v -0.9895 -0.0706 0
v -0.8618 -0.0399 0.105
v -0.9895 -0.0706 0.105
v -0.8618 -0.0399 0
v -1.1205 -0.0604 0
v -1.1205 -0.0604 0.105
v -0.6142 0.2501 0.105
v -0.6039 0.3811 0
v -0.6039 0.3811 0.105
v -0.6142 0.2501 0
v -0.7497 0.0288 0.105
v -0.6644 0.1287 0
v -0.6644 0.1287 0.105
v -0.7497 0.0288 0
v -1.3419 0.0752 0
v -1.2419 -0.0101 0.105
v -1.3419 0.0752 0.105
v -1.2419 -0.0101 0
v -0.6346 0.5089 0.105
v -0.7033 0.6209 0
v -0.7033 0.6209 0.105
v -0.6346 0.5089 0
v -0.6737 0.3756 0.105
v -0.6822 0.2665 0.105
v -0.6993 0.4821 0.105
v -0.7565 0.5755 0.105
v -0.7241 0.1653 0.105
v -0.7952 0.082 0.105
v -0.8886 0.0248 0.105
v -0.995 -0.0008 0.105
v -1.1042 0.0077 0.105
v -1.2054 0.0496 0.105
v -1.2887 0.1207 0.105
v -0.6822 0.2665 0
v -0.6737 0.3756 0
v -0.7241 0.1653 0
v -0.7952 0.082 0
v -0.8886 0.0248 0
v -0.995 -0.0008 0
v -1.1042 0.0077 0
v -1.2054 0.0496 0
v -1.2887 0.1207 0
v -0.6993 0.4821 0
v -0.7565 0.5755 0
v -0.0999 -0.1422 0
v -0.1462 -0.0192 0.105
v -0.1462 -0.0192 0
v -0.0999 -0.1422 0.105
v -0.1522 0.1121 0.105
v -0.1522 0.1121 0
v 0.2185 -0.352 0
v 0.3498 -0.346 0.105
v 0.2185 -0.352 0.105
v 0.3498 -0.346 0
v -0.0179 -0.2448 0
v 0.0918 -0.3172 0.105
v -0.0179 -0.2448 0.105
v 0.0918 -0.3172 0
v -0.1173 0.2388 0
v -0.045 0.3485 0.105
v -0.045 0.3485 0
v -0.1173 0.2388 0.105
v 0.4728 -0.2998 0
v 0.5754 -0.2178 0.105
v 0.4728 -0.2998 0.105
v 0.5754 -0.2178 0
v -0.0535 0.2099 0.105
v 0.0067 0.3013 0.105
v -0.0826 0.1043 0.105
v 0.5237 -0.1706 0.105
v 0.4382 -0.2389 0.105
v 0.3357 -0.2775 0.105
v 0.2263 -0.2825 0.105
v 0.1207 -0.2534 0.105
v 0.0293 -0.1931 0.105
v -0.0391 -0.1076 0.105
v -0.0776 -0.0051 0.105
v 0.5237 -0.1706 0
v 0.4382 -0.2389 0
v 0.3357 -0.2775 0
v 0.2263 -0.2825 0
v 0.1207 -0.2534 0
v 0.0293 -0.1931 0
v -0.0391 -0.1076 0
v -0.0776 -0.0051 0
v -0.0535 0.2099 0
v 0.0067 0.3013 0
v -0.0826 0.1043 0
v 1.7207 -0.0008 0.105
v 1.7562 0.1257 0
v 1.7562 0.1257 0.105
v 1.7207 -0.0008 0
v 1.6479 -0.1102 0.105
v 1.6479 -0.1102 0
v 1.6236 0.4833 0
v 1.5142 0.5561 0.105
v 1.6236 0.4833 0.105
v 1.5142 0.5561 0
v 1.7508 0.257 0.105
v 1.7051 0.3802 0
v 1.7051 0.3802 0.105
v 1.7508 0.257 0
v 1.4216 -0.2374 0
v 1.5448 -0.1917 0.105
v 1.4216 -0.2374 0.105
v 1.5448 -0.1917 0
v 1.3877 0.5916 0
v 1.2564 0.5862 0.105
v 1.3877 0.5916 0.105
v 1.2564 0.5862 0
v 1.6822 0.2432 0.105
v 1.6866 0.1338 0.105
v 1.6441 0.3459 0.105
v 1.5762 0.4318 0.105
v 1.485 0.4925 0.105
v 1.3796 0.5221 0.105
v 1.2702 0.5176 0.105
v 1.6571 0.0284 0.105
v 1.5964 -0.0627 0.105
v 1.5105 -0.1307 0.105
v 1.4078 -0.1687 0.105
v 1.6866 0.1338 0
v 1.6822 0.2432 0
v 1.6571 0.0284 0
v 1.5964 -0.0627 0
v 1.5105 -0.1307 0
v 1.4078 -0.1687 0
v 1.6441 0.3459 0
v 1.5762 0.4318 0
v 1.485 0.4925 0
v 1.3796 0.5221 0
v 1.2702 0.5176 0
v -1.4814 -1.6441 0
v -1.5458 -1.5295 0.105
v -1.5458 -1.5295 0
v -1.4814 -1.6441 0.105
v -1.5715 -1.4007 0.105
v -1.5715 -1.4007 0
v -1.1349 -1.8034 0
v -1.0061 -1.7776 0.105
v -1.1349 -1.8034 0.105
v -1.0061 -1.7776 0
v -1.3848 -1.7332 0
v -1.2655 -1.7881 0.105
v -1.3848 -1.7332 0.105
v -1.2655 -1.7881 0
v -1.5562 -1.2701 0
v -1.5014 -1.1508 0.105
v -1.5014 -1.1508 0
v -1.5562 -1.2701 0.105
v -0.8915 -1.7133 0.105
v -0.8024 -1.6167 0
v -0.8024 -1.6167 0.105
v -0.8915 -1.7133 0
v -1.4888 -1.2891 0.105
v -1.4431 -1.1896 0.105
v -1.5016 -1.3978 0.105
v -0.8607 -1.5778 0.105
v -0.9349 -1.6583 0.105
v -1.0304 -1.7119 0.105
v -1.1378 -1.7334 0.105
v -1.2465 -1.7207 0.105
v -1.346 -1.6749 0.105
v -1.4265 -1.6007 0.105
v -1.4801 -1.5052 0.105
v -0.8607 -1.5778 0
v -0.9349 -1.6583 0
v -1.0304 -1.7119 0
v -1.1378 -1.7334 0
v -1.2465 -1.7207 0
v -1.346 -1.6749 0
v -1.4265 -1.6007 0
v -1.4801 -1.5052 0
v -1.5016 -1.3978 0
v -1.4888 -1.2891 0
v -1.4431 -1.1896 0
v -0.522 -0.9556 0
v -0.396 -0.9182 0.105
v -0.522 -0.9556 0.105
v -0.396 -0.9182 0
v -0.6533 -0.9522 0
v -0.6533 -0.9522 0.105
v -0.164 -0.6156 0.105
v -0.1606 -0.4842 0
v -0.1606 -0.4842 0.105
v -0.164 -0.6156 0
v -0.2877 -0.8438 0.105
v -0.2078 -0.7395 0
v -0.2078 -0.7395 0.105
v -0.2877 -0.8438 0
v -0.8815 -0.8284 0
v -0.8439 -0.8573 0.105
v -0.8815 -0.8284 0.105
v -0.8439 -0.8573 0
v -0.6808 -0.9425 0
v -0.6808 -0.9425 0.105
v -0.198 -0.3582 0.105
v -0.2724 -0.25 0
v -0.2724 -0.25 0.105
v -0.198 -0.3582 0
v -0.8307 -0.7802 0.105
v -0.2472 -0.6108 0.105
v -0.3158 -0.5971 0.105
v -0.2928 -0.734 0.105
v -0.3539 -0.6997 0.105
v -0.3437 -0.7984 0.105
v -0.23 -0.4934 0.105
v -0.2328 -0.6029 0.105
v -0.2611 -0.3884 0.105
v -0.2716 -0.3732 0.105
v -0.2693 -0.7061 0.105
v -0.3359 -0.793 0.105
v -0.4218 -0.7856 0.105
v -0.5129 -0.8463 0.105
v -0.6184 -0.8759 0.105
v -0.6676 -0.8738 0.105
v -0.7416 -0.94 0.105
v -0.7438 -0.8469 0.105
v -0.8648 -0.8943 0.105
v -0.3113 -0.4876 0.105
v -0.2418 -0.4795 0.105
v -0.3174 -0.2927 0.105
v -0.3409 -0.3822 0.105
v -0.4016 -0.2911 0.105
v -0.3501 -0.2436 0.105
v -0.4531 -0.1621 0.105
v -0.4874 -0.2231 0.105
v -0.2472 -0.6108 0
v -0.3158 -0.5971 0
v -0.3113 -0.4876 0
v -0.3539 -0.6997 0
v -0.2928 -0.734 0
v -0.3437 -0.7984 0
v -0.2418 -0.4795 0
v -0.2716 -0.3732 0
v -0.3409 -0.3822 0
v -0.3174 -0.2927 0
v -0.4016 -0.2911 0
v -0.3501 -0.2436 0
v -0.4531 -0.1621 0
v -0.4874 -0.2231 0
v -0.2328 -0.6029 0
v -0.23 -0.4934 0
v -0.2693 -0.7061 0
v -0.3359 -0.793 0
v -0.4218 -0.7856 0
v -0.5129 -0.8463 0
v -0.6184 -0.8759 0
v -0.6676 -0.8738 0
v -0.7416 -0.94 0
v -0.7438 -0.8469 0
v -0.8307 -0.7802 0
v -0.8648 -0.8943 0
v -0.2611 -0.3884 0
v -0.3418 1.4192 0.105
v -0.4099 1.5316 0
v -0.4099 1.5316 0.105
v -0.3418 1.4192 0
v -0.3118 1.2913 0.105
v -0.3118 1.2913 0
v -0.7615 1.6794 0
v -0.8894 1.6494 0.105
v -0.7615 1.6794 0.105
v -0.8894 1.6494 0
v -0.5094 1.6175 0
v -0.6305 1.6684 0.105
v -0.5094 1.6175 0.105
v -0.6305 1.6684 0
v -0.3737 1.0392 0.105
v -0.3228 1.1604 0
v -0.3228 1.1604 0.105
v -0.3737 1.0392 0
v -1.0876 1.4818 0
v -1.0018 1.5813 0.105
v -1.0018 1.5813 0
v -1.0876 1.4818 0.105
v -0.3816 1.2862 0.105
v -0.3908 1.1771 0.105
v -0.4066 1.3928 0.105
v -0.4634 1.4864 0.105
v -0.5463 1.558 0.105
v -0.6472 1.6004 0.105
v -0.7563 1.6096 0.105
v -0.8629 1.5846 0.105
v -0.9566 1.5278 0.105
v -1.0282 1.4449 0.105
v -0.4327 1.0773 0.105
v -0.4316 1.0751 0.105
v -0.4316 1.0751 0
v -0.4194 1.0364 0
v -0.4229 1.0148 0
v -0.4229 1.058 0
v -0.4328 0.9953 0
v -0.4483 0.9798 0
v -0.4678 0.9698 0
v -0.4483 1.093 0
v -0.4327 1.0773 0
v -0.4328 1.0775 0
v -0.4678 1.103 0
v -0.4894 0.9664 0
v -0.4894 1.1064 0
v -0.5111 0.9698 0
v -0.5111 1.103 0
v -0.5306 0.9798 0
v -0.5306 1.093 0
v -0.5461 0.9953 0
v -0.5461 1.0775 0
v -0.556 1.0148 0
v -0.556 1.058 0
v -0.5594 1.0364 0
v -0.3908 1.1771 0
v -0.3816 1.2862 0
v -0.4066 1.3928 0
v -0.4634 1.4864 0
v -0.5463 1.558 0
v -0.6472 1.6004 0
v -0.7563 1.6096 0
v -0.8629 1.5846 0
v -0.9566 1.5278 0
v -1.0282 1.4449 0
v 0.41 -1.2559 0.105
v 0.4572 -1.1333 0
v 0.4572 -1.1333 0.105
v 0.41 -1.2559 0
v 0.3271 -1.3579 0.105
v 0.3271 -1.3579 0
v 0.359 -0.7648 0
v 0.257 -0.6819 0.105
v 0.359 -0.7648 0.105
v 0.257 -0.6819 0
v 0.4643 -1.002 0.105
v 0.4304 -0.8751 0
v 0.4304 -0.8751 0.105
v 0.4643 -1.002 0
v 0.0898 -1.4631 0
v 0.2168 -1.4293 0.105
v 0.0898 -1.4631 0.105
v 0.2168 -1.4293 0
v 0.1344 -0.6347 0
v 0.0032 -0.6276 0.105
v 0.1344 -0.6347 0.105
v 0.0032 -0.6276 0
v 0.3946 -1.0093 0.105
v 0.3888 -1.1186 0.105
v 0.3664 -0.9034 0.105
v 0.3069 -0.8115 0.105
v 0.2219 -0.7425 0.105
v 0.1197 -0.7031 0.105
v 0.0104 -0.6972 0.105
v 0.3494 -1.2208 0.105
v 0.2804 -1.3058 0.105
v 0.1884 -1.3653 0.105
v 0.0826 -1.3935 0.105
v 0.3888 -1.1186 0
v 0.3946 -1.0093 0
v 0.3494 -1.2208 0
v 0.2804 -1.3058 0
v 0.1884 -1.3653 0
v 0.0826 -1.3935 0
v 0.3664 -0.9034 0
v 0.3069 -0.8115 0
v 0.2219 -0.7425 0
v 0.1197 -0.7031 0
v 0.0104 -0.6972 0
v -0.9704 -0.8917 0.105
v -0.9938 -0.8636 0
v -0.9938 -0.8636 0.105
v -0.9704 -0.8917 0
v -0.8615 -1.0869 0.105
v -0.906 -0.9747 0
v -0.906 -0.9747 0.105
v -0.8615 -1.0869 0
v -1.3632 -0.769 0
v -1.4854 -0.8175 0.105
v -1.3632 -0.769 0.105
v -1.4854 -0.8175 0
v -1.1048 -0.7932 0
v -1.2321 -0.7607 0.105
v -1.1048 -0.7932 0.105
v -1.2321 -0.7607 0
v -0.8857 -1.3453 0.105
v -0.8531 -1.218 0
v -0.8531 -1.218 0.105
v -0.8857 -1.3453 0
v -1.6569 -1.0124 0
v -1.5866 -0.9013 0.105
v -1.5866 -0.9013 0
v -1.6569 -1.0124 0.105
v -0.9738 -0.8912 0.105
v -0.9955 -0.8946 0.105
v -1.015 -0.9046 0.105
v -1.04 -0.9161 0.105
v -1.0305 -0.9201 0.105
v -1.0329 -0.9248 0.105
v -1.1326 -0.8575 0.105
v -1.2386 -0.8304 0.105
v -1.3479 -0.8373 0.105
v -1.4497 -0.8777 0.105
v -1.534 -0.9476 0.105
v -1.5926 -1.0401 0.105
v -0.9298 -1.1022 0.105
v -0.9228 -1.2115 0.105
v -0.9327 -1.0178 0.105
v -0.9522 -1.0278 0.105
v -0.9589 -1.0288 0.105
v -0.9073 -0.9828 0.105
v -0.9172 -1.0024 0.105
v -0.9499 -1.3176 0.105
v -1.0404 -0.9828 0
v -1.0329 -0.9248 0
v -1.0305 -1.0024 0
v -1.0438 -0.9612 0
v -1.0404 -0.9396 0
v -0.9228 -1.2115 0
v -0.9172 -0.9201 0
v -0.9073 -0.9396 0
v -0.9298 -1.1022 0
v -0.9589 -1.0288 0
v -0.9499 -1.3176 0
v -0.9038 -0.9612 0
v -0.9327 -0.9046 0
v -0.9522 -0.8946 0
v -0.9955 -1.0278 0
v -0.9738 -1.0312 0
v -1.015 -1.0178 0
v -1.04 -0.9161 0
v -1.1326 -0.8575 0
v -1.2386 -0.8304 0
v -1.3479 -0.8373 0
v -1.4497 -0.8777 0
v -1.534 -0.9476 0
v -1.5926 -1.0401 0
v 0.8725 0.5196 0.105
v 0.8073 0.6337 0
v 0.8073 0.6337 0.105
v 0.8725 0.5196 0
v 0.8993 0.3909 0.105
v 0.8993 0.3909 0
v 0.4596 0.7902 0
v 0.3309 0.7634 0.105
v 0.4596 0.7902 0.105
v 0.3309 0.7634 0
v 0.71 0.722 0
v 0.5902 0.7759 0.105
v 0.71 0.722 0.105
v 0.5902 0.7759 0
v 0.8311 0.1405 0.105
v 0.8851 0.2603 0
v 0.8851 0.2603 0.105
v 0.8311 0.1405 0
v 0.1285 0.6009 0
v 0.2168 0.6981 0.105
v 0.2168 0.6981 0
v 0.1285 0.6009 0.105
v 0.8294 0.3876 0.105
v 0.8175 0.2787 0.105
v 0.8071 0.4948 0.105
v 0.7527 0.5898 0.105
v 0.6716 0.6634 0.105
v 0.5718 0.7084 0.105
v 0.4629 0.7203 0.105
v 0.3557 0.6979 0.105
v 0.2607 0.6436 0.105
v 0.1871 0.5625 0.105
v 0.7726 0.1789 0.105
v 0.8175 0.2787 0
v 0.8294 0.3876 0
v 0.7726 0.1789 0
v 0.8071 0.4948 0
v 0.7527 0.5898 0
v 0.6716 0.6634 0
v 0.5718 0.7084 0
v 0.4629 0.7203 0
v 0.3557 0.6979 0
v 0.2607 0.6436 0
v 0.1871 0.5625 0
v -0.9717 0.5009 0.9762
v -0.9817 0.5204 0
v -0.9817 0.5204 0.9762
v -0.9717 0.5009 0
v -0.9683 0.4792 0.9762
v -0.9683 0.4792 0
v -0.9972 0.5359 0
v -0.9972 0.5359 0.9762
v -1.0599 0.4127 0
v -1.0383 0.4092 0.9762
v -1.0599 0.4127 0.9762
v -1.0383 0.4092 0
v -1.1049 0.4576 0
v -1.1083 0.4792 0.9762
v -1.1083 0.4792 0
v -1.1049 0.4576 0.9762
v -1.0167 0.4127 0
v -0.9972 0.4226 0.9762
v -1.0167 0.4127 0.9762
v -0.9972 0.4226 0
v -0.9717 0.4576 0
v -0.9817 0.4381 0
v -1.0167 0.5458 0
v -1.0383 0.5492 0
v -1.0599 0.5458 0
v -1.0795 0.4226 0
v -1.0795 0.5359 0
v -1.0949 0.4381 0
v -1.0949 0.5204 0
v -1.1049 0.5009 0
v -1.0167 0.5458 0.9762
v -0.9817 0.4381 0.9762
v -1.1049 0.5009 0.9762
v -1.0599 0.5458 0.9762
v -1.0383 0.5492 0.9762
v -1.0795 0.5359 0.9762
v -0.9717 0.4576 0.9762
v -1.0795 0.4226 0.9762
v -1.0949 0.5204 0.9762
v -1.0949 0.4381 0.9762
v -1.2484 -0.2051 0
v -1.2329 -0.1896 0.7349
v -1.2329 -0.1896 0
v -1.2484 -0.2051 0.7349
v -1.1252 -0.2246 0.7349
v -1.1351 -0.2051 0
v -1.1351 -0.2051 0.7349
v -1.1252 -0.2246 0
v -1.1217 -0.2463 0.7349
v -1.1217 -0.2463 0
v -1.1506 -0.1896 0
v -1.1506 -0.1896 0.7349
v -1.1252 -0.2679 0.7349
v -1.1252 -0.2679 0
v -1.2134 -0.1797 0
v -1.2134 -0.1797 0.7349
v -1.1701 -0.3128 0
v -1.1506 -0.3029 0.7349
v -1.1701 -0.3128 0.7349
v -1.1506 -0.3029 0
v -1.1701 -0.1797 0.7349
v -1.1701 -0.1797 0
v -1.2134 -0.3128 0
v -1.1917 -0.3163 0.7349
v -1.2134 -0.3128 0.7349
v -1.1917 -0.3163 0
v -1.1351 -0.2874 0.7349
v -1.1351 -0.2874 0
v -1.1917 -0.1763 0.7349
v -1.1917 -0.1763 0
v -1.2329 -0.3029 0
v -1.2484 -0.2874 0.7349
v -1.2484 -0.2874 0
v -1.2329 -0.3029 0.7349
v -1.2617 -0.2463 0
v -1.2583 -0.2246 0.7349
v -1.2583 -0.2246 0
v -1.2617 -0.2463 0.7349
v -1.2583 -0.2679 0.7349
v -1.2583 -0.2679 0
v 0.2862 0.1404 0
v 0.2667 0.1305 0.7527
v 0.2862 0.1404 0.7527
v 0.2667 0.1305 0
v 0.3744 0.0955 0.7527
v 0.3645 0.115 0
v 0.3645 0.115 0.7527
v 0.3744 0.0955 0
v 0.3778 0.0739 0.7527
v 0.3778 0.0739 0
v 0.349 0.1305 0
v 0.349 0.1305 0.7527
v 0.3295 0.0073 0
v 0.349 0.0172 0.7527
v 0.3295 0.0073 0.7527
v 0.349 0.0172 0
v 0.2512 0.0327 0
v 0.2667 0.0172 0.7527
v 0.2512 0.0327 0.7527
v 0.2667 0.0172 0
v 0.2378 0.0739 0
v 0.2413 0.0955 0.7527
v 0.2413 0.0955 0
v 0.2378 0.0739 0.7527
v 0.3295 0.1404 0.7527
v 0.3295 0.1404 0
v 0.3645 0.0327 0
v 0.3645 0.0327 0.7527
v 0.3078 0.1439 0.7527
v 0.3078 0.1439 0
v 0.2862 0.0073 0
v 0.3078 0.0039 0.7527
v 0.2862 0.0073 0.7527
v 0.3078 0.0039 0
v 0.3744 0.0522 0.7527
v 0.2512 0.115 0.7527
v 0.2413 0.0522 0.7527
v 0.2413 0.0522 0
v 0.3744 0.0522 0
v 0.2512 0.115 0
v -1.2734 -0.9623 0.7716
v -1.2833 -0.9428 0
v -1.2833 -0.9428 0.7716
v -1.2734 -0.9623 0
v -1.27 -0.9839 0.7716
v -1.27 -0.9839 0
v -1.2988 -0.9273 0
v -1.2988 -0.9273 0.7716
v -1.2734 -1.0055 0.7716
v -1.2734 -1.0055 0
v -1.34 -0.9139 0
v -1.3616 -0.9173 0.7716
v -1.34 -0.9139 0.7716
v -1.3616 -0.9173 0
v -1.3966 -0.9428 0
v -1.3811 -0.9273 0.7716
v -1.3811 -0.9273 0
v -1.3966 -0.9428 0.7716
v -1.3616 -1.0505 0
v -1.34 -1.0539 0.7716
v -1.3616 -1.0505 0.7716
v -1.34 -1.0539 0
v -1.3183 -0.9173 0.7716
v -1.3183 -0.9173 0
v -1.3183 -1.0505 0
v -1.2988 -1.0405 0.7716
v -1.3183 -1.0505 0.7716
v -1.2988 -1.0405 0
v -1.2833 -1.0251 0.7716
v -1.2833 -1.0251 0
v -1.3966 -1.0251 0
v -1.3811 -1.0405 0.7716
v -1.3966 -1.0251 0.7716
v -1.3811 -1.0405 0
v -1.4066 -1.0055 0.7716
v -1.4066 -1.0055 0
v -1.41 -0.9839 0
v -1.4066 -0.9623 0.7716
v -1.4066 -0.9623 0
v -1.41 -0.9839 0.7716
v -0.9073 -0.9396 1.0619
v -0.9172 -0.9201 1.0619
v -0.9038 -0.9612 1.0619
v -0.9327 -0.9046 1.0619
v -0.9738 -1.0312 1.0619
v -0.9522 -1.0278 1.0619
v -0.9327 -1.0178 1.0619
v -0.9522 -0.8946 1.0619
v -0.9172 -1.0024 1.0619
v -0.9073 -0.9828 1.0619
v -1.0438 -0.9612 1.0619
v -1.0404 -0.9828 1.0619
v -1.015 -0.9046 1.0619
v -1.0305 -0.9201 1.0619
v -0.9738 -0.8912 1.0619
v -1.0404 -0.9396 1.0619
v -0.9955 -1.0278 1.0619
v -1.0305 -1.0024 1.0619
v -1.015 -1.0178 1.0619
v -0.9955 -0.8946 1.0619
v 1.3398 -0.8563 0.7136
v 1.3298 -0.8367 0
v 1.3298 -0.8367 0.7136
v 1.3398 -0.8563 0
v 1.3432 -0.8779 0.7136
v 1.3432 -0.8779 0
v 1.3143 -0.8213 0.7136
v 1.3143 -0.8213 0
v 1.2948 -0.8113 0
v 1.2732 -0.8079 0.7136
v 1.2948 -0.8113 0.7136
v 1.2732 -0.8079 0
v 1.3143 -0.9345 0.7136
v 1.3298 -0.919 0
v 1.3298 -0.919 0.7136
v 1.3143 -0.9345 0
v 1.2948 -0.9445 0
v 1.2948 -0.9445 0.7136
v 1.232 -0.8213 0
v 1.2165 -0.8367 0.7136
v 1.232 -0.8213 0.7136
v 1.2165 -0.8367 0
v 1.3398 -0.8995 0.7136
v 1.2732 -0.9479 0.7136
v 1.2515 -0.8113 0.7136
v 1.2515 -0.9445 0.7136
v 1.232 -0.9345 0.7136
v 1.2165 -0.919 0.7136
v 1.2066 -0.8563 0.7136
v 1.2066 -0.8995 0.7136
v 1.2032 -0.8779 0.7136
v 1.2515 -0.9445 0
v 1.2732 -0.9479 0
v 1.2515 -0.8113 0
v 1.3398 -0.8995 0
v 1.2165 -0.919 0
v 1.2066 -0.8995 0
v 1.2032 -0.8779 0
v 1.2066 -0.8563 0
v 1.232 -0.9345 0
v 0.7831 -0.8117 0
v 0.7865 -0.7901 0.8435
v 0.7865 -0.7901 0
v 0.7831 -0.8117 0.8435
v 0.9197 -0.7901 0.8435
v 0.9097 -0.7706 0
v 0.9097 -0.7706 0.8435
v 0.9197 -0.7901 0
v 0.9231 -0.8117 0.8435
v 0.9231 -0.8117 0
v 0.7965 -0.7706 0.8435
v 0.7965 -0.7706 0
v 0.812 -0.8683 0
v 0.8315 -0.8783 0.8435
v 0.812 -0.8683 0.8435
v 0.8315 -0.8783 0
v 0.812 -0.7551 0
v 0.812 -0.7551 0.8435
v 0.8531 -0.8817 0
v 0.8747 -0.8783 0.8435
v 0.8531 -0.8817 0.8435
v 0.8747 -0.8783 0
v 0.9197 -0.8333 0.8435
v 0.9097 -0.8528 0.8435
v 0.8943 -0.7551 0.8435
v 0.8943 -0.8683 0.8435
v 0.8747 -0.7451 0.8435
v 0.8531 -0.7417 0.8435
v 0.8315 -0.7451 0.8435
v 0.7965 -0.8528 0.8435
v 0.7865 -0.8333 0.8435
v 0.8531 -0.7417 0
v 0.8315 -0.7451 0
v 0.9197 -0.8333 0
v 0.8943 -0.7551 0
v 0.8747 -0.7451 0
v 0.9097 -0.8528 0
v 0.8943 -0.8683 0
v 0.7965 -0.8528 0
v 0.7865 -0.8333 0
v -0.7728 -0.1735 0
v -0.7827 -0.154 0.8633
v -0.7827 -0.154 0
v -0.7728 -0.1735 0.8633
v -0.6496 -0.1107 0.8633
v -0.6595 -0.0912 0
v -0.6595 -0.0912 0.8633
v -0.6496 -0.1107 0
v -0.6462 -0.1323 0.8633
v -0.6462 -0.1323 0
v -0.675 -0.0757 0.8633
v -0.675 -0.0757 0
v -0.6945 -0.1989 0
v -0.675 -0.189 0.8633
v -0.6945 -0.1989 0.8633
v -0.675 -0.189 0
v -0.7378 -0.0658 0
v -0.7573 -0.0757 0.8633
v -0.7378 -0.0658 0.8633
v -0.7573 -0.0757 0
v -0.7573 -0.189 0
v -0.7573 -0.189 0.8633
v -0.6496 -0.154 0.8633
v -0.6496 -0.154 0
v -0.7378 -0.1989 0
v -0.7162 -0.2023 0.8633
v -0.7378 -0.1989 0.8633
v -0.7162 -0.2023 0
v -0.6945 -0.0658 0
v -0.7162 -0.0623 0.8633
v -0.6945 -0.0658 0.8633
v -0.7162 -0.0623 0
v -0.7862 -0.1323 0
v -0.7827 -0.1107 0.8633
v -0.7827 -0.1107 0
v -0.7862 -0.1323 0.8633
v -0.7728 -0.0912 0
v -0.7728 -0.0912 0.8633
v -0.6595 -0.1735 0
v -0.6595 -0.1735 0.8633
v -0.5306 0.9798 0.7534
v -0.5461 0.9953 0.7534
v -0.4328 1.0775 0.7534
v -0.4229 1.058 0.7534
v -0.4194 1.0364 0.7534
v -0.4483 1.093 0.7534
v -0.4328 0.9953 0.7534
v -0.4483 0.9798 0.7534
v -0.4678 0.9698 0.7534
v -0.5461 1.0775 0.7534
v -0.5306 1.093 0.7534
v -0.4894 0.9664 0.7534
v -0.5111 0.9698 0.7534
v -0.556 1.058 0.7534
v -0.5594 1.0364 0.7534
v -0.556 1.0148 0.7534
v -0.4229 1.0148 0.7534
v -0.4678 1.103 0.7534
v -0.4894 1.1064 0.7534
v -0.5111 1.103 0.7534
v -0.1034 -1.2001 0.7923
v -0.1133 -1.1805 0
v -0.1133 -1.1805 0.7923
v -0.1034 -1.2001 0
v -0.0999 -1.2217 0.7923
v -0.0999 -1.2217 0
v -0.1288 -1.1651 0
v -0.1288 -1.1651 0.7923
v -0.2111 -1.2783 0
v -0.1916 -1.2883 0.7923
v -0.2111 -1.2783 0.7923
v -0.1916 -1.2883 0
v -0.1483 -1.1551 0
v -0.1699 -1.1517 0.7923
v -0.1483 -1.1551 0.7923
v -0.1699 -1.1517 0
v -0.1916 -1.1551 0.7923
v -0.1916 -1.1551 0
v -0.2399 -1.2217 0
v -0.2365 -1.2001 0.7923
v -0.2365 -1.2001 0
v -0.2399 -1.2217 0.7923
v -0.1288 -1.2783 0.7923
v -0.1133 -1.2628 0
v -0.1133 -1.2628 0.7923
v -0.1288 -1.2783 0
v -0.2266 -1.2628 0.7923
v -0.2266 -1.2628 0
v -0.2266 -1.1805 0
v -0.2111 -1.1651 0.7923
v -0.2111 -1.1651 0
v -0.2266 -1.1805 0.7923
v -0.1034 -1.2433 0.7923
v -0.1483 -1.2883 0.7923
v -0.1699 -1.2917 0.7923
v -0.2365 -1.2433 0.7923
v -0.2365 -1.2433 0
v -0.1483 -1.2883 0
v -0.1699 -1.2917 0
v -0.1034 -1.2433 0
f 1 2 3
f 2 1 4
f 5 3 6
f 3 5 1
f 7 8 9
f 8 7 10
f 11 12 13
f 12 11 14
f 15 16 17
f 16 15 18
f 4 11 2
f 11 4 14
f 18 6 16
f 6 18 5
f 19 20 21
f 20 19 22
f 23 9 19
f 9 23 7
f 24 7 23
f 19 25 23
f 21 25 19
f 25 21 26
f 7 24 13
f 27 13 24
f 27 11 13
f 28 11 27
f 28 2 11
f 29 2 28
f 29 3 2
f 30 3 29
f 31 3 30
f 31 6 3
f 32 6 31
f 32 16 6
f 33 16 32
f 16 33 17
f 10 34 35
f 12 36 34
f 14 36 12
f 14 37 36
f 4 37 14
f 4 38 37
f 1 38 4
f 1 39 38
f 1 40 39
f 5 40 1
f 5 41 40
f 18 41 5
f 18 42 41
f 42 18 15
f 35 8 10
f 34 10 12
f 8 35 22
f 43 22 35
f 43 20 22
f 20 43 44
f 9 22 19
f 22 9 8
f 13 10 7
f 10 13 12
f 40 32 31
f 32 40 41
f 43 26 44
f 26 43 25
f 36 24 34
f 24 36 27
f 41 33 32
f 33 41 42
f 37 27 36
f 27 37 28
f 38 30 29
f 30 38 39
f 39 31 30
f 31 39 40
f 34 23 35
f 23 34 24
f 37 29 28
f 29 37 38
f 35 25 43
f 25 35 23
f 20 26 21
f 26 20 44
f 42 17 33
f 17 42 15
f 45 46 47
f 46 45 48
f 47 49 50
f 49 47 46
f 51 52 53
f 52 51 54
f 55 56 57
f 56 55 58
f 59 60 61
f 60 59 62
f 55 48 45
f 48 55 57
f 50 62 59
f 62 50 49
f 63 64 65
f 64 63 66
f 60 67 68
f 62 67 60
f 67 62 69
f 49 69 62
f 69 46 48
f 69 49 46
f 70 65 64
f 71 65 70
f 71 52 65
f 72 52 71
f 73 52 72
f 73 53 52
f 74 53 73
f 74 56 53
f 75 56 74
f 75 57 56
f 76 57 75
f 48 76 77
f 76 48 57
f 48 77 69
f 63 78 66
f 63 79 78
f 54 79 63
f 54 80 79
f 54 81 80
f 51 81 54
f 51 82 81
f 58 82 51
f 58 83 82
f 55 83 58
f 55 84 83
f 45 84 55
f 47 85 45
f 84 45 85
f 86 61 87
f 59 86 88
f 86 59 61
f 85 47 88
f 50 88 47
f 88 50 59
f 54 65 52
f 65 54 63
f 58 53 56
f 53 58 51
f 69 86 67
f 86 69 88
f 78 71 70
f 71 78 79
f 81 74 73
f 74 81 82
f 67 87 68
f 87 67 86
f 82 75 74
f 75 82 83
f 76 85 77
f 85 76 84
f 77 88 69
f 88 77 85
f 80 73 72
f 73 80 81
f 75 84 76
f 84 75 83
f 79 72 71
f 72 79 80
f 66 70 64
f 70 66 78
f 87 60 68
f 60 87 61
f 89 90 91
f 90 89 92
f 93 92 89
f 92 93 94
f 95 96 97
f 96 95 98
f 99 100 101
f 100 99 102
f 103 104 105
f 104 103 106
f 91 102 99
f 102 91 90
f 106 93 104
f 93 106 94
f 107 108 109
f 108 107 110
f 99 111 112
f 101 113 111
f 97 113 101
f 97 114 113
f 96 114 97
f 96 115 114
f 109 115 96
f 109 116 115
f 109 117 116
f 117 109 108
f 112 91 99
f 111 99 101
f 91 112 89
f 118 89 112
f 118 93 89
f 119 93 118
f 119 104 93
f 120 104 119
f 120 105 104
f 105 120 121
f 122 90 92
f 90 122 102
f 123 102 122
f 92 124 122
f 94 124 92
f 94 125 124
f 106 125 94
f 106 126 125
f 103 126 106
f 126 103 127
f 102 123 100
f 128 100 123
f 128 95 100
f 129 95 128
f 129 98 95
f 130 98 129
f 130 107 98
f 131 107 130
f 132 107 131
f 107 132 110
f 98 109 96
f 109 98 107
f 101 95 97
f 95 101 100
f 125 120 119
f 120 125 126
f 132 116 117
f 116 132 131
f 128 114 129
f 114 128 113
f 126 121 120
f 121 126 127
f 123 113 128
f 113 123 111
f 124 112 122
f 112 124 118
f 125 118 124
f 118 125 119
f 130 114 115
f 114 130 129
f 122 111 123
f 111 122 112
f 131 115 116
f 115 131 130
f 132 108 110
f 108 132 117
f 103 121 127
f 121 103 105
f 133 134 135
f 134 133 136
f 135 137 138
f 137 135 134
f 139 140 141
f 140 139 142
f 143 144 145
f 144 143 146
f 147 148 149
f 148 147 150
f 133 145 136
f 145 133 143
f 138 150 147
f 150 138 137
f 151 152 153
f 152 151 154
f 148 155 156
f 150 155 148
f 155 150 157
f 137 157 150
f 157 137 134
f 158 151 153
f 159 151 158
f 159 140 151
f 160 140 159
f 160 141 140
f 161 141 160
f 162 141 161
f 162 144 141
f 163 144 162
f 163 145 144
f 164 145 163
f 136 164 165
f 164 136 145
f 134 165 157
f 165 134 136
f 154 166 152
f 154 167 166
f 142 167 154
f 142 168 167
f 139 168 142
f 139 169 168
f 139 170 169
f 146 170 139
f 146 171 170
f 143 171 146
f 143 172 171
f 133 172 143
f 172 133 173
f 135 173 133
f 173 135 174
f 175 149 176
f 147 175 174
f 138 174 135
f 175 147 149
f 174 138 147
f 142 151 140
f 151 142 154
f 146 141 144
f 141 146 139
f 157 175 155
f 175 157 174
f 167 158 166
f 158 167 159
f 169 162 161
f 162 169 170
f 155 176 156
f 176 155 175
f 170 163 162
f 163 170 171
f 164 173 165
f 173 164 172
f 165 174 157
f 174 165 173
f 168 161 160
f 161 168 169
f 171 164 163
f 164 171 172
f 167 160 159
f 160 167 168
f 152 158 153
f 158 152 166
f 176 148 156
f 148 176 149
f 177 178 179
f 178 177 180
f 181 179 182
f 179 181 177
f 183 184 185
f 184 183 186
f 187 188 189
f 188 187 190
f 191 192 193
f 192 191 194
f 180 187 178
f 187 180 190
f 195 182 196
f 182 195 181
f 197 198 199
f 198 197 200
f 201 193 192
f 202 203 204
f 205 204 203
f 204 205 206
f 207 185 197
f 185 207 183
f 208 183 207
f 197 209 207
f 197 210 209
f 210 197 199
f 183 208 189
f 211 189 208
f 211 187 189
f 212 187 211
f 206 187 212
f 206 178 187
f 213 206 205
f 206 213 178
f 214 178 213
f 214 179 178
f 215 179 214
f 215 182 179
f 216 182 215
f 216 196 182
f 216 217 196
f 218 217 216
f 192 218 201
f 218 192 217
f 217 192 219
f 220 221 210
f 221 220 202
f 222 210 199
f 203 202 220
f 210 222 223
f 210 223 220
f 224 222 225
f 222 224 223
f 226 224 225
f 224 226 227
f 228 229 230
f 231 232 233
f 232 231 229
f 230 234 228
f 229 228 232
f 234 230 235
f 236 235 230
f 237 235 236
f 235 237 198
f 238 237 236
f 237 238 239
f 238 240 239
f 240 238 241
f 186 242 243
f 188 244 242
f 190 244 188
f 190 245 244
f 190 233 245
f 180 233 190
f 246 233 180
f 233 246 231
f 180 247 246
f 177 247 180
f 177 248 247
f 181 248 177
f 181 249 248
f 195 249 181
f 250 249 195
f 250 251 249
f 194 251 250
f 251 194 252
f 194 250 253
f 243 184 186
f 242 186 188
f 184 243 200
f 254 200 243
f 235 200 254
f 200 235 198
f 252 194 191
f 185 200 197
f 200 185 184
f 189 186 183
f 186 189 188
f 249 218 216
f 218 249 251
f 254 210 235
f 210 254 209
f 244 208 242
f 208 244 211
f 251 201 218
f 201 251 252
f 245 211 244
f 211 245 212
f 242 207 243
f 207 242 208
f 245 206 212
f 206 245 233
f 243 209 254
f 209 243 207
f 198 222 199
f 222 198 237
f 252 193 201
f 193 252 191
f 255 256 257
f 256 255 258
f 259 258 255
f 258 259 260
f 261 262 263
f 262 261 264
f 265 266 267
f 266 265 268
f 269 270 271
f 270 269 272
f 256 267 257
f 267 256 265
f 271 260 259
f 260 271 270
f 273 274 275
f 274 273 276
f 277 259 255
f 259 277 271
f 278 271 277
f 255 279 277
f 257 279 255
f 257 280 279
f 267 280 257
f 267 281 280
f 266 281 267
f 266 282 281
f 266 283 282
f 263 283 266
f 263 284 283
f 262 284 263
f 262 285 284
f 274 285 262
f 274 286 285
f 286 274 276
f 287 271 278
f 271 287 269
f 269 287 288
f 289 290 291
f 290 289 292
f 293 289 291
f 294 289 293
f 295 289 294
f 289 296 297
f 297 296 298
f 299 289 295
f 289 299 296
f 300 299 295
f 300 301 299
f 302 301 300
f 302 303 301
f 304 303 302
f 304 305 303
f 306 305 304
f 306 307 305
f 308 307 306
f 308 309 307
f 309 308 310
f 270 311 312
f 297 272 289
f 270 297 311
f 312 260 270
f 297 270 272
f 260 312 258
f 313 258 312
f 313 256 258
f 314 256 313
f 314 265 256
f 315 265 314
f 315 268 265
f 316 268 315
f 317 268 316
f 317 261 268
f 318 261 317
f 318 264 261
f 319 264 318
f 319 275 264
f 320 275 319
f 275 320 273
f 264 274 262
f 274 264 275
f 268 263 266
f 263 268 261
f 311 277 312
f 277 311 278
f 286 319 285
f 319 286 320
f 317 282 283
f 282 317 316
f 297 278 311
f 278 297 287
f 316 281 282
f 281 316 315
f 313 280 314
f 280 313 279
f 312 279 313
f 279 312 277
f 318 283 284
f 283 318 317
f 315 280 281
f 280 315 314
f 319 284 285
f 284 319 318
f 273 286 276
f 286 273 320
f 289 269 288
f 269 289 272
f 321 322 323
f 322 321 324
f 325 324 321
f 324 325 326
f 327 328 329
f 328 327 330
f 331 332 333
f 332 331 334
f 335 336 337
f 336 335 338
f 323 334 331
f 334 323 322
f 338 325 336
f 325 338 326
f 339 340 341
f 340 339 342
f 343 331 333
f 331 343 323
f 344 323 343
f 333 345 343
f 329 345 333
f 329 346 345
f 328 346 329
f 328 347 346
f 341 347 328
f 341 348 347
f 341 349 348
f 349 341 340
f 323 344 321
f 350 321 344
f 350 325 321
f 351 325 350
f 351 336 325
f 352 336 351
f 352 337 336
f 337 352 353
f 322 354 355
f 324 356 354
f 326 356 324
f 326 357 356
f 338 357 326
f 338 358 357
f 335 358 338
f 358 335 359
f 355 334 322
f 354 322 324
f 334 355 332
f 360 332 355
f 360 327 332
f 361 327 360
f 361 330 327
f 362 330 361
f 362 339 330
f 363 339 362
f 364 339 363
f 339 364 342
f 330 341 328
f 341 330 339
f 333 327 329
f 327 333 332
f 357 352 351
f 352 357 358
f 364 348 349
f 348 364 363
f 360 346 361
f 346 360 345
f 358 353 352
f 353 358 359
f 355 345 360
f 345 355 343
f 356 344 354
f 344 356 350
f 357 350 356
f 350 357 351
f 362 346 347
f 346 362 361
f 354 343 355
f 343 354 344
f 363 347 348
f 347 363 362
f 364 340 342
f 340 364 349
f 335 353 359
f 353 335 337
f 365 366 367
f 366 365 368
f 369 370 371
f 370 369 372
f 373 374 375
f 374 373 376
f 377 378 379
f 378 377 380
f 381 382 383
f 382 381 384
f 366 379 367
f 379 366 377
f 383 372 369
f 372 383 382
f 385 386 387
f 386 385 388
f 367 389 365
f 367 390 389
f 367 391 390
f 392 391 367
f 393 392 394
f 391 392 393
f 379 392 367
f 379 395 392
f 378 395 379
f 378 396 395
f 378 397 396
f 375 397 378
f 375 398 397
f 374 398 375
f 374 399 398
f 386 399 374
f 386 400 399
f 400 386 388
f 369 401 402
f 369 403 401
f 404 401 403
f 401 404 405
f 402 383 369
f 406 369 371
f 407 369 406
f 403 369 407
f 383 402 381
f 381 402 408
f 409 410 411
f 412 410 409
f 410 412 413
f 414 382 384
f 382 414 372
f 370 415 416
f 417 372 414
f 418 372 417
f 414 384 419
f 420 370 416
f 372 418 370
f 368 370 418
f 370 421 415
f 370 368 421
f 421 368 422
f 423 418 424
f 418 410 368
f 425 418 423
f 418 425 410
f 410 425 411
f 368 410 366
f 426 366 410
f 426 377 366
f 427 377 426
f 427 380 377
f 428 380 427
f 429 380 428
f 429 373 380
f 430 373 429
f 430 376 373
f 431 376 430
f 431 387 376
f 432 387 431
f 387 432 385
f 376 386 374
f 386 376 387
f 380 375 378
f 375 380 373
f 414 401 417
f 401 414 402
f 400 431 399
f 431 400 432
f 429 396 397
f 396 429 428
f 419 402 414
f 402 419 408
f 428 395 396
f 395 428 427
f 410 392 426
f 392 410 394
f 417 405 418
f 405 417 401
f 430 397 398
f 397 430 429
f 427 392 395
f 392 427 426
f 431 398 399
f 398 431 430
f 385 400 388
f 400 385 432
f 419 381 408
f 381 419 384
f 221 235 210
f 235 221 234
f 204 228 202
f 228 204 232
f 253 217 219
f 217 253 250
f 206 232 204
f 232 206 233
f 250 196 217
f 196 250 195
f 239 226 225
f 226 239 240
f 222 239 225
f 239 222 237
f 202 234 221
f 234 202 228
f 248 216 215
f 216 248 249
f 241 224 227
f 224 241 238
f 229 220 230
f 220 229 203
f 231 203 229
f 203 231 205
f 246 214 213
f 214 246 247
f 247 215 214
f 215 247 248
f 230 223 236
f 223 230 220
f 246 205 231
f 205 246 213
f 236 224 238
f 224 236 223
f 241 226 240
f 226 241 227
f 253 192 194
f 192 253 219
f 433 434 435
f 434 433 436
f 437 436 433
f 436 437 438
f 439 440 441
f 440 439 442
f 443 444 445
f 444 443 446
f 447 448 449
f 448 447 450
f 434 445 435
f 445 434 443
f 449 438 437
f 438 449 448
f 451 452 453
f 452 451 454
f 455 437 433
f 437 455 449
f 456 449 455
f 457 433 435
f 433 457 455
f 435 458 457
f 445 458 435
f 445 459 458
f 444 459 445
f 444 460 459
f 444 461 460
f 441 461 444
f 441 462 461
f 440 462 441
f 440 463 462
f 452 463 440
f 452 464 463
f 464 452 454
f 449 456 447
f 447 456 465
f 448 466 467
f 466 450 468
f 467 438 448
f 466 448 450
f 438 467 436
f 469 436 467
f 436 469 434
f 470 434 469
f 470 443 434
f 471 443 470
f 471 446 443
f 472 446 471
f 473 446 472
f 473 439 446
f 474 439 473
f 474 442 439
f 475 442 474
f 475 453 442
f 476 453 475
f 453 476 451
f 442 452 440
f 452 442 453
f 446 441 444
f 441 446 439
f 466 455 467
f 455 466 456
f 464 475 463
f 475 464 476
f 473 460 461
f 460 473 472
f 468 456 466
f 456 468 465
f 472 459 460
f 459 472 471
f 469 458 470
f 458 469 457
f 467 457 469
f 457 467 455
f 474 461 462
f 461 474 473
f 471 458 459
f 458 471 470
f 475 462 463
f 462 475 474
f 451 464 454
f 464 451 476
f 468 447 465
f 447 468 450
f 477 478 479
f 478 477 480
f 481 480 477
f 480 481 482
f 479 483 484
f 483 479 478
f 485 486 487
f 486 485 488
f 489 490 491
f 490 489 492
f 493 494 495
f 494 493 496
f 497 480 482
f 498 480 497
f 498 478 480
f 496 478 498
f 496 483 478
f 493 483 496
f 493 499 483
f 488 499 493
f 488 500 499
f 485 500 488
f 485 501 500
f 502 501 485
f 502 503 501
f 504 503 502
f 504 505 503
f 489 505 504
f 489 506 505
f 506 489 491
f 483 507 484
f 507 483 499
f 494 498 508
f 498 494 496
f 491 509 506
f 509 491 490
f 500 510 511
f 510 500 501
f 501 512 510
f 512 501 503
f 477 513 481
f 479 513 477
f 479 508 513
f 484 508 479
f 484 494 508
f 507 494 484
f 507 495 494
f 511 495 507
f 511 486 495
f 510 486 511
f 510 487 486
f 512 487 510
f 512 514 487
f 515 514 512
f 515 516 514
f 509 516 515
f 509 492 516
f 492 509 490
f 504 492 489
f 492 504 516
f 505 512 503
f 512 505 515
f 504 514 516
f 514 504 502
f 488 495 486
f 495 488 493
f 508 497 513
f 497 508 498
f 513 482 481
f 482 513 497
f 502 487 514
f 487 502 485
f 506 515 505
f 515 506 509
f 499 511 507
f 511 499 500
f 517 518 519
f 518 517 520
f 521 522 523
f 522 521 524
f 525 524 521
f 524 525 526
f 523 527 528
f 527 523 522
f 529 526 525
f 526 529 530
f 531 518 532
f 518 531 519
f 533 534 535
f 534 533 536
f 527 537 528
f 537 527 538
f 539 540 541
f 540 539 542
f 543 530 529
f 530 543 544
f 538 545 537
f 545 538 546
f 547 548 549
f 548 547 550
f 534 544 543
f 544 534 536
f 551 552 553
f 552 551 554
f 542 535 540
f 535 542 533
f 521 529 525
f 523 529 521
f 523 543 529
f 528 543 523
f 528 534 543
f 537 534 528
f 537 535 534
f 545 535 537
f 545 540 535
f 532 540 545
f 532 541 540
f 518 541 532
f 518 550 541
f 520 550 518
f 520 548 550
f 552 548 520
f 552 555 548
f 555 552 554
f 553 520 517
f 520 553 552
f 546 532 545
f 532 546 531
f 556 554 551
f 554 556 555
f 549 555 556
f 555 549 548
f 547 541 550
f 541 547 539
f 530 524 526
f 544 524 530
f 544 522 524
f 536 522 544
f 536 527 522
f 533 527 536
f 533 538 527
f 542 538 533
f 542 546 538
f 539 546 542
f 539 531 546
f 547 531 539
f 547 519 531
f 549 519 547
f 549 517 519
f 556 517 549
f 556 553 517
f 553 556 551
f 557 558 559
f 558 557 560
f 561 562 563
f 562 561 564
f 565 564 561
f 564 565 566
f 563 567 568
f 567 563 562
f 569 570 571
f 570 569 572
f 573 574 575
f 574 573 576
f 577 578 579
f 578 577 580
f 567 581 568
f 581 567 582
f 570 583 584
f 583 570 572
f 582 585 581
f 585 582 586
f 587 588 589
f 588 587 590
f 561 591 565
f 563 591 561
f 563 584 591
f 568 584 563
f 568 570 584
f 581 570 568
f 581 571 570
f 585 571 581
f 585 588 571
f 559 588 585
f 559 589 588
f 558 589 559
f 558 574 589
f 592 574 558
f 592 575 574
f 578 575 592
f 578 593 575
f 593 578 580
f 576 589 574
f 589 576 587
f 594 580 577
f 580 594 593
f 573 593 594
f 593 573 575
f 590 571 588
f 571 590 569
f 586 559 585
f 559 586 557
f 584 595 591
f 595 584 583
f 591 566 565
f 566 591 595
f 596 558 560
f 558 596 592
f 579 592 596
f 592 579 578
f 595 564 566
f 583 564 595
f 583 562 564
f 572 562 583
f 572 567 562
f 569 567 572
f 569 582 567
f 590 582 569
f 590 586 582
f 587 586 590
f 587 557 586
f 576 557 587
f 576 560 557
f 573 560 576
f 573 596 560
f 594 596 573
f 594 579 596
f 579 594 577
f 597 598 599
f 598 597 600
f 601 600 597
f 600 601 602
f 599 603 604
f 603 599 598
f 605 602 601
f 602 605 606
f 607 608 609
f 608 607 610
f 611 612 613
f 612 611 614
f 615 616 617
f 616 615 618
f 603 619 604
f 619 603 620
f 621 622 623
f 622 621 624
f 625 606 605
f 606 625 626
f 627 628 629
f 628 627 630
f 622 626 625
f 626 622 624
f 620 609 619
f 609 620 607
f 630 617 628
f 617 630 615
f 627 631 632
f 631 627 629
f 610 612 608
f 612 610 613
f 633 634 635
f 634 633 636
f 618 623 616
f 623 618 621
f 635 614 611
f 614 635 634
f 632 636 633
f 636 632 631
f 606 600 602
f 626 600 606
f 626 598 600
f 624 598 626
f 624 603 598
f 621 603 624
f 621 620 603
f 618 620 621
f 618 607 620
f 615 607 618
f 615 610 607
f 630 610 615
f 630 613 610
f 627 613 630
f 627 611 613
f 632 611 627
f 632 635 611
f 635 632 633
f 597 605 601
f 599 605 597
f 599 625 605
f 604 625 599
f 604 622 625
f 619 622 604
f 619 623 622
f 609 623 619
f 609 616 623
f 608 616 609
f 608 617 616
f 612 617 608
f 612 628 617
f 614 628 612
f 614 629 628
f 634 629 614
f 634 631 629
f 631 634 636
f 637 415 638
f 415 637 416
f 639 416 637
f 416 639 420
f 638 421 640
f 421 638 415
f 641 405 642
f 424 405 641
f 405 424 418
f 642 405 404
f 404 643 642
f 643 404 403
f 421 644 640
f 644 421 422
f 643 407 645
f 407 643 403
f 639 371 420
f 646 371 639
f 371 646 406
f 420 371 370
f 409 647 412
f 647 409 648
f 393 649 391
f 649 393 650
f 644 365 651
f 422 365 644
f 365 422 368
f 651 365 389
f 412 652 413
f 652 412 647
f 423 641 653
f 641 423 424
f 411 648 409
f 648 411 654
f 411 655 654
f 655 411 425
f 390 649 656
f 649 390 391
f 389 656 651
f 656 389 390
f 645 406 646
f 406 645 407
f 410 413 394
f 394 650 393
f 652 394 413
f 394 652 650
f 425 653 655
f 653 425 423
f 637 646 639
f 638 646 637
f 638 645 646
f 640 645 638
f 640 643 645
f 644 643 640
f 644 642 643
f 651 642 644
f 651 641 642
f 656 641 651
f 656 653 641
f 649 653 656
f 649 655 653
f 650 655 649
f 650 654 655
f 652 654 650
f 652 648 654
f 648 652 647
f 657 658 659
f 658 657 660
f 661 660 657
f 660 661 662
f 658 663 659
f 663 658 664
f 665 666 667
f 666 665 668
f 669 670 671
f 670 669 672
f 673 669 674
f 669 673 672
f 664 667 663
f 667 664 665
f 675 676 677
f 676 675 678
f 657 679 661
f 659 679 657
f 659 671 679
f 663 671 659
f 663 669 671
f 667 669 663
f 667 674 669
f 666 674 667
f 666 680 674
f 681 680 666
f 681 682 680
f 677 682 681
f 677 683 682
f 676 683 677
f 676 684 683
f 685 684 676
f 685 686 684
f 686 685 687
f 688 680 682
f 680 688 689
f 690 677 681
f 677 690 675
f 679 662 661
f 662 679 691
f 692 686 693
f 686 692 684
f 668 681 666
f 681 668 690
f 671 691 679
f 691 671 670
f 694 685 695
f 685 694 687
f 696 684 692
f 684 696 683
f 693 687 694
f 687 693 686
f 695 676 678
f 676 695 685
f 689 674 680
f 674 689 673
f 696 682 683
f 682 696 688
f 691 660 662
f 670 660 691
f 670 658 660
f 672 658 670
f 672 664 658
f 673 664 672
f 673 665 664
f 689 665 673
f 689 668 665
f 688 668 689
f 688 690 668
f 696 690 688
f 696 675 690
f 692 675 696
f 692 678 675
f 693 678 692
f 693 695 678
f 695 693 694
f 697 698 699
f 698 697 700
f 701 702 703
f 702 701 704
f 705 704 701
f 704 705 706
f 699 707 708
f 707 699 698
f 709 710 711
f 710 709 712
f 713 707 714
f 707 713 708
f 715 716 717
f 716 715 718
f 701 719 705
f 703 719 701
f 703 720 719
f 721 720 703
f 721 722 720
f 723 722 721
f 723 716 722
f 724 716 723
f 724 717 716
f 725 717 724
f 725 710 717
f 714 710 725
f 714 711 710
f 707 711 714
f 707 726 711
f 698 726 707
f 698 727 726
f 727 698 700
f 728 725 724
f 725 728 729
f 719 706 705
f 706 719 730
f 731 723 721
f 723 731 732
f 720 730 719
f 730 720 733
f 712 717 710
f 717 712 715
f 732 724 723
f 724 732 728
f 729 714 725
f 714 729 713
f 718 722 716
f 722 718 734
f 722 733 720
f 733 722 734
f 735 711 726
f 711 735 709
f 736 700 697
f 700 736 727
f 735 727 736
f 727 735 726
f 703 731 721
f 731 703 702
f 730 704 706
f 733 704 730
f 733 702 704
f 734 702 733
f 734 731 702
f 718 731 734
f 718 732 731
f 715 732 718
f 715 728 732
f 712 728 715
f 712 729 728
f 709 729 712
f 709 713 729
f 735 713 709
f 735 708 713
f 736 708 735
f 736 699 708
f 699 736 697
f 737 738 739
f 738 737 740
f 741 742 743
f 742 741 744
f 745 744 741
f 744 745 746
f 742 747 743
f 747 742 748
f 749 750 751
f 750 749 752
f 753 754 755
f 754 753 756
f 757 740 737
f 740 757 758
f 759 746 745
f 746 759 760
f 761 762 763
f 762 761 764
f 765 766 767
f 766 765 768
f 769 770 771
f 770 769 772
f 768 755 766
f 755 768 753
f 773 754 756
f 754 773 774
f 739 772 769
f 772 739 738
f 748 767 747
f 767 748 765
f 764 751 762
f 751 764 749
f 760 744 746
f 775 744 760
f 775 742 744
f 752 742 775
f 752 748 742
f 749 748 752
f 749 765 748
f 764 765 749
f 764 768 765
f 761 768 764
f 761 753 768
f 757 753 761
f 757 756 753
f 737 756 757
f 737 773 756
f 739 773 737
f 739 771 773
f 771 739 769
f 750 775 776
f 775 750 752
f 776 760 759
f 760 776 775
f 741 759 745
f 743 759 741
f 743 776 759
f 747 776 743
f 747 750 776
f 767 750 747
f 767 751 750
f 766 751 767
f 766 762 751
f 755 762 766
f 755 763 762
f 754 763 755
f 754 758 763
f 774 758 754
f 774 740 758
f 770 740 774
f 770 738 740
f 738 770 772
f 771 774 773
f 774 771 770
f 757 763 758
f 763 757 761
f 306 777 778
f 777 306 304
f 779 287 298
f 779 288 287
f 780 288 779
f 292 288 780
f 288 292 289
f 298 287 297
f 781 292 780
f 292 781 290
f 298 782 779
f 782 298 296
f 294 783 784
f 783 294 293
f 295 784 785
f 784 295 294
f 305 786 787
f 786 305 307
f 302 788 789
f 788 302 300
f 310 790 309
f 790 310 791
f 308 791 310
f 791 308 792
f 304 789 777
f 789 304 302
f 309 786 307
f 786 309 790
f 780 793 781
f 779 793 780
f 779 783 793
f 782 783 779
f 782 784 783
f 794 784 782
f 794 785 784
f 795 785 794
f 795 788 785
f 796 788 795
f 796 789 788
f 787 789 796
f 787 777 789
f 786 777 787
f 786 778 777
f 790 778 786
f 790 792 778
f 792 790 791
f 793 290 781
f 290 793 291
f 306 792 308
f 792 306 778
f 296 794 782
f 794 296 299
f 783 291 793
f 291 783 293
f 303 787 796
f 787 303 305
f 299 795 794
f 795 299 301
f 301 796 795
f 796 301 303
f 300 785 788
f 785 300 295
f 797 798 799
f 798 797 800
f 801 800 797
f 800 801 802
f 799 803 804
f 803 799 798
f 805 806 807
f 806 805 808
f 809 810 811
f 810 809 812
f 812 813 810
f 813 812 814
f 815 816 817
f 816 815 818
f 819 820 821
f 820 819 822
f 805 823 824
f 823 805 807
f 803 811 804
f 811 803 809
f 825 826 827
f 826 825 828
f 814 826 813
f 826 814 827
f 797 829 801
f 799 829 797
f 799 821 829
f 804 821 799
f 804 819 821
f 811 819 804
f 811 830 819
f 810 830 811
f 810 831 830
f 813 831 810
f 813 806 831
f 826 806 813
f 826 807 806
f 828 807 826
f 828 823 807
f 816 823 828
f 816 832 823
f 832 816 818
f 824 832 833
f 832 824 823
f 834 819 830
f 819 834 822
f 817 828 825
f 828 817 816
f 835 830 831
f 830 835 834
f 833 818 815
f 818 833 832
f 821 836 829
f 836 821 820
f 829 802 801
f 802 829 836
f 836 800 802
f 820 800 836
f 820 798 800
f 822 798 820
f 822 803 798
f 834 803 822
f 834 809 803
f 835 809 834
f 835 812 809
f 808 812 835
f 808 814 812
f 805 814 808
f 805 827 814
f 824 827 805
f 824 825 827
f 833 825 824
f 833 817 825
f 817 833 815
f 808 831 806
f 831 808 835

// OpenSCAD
$fn=20;
seed=50;

count=20;
place = [
         rands(-1,1,count,seed),
         rands(-1,1,count,seed+50),
         rands(0.5,0.8,count,seed + 20),
         rands(0,360,count,seed + 20),
         ];

for (i = [0:count-1]) {
  x = place[0][i];
  y = place[1][i];
  z = place[2][i];
  a = place[3][i];
  
  scale(1.4)
    translate([x,y,0])
    if (i < 10) {
      cylinder(z, 0.05,0.05);
    } else {
      rotate(a) {
        difference() {
          cylinder(0.075, 0.3, 0.3);
          translate([0, 0, -0.1])
            cylinder(0.3, 0.25, 0.25);
          translate([0, -0.5, 0])
            cube(1);
        }
      }
    }
 }
